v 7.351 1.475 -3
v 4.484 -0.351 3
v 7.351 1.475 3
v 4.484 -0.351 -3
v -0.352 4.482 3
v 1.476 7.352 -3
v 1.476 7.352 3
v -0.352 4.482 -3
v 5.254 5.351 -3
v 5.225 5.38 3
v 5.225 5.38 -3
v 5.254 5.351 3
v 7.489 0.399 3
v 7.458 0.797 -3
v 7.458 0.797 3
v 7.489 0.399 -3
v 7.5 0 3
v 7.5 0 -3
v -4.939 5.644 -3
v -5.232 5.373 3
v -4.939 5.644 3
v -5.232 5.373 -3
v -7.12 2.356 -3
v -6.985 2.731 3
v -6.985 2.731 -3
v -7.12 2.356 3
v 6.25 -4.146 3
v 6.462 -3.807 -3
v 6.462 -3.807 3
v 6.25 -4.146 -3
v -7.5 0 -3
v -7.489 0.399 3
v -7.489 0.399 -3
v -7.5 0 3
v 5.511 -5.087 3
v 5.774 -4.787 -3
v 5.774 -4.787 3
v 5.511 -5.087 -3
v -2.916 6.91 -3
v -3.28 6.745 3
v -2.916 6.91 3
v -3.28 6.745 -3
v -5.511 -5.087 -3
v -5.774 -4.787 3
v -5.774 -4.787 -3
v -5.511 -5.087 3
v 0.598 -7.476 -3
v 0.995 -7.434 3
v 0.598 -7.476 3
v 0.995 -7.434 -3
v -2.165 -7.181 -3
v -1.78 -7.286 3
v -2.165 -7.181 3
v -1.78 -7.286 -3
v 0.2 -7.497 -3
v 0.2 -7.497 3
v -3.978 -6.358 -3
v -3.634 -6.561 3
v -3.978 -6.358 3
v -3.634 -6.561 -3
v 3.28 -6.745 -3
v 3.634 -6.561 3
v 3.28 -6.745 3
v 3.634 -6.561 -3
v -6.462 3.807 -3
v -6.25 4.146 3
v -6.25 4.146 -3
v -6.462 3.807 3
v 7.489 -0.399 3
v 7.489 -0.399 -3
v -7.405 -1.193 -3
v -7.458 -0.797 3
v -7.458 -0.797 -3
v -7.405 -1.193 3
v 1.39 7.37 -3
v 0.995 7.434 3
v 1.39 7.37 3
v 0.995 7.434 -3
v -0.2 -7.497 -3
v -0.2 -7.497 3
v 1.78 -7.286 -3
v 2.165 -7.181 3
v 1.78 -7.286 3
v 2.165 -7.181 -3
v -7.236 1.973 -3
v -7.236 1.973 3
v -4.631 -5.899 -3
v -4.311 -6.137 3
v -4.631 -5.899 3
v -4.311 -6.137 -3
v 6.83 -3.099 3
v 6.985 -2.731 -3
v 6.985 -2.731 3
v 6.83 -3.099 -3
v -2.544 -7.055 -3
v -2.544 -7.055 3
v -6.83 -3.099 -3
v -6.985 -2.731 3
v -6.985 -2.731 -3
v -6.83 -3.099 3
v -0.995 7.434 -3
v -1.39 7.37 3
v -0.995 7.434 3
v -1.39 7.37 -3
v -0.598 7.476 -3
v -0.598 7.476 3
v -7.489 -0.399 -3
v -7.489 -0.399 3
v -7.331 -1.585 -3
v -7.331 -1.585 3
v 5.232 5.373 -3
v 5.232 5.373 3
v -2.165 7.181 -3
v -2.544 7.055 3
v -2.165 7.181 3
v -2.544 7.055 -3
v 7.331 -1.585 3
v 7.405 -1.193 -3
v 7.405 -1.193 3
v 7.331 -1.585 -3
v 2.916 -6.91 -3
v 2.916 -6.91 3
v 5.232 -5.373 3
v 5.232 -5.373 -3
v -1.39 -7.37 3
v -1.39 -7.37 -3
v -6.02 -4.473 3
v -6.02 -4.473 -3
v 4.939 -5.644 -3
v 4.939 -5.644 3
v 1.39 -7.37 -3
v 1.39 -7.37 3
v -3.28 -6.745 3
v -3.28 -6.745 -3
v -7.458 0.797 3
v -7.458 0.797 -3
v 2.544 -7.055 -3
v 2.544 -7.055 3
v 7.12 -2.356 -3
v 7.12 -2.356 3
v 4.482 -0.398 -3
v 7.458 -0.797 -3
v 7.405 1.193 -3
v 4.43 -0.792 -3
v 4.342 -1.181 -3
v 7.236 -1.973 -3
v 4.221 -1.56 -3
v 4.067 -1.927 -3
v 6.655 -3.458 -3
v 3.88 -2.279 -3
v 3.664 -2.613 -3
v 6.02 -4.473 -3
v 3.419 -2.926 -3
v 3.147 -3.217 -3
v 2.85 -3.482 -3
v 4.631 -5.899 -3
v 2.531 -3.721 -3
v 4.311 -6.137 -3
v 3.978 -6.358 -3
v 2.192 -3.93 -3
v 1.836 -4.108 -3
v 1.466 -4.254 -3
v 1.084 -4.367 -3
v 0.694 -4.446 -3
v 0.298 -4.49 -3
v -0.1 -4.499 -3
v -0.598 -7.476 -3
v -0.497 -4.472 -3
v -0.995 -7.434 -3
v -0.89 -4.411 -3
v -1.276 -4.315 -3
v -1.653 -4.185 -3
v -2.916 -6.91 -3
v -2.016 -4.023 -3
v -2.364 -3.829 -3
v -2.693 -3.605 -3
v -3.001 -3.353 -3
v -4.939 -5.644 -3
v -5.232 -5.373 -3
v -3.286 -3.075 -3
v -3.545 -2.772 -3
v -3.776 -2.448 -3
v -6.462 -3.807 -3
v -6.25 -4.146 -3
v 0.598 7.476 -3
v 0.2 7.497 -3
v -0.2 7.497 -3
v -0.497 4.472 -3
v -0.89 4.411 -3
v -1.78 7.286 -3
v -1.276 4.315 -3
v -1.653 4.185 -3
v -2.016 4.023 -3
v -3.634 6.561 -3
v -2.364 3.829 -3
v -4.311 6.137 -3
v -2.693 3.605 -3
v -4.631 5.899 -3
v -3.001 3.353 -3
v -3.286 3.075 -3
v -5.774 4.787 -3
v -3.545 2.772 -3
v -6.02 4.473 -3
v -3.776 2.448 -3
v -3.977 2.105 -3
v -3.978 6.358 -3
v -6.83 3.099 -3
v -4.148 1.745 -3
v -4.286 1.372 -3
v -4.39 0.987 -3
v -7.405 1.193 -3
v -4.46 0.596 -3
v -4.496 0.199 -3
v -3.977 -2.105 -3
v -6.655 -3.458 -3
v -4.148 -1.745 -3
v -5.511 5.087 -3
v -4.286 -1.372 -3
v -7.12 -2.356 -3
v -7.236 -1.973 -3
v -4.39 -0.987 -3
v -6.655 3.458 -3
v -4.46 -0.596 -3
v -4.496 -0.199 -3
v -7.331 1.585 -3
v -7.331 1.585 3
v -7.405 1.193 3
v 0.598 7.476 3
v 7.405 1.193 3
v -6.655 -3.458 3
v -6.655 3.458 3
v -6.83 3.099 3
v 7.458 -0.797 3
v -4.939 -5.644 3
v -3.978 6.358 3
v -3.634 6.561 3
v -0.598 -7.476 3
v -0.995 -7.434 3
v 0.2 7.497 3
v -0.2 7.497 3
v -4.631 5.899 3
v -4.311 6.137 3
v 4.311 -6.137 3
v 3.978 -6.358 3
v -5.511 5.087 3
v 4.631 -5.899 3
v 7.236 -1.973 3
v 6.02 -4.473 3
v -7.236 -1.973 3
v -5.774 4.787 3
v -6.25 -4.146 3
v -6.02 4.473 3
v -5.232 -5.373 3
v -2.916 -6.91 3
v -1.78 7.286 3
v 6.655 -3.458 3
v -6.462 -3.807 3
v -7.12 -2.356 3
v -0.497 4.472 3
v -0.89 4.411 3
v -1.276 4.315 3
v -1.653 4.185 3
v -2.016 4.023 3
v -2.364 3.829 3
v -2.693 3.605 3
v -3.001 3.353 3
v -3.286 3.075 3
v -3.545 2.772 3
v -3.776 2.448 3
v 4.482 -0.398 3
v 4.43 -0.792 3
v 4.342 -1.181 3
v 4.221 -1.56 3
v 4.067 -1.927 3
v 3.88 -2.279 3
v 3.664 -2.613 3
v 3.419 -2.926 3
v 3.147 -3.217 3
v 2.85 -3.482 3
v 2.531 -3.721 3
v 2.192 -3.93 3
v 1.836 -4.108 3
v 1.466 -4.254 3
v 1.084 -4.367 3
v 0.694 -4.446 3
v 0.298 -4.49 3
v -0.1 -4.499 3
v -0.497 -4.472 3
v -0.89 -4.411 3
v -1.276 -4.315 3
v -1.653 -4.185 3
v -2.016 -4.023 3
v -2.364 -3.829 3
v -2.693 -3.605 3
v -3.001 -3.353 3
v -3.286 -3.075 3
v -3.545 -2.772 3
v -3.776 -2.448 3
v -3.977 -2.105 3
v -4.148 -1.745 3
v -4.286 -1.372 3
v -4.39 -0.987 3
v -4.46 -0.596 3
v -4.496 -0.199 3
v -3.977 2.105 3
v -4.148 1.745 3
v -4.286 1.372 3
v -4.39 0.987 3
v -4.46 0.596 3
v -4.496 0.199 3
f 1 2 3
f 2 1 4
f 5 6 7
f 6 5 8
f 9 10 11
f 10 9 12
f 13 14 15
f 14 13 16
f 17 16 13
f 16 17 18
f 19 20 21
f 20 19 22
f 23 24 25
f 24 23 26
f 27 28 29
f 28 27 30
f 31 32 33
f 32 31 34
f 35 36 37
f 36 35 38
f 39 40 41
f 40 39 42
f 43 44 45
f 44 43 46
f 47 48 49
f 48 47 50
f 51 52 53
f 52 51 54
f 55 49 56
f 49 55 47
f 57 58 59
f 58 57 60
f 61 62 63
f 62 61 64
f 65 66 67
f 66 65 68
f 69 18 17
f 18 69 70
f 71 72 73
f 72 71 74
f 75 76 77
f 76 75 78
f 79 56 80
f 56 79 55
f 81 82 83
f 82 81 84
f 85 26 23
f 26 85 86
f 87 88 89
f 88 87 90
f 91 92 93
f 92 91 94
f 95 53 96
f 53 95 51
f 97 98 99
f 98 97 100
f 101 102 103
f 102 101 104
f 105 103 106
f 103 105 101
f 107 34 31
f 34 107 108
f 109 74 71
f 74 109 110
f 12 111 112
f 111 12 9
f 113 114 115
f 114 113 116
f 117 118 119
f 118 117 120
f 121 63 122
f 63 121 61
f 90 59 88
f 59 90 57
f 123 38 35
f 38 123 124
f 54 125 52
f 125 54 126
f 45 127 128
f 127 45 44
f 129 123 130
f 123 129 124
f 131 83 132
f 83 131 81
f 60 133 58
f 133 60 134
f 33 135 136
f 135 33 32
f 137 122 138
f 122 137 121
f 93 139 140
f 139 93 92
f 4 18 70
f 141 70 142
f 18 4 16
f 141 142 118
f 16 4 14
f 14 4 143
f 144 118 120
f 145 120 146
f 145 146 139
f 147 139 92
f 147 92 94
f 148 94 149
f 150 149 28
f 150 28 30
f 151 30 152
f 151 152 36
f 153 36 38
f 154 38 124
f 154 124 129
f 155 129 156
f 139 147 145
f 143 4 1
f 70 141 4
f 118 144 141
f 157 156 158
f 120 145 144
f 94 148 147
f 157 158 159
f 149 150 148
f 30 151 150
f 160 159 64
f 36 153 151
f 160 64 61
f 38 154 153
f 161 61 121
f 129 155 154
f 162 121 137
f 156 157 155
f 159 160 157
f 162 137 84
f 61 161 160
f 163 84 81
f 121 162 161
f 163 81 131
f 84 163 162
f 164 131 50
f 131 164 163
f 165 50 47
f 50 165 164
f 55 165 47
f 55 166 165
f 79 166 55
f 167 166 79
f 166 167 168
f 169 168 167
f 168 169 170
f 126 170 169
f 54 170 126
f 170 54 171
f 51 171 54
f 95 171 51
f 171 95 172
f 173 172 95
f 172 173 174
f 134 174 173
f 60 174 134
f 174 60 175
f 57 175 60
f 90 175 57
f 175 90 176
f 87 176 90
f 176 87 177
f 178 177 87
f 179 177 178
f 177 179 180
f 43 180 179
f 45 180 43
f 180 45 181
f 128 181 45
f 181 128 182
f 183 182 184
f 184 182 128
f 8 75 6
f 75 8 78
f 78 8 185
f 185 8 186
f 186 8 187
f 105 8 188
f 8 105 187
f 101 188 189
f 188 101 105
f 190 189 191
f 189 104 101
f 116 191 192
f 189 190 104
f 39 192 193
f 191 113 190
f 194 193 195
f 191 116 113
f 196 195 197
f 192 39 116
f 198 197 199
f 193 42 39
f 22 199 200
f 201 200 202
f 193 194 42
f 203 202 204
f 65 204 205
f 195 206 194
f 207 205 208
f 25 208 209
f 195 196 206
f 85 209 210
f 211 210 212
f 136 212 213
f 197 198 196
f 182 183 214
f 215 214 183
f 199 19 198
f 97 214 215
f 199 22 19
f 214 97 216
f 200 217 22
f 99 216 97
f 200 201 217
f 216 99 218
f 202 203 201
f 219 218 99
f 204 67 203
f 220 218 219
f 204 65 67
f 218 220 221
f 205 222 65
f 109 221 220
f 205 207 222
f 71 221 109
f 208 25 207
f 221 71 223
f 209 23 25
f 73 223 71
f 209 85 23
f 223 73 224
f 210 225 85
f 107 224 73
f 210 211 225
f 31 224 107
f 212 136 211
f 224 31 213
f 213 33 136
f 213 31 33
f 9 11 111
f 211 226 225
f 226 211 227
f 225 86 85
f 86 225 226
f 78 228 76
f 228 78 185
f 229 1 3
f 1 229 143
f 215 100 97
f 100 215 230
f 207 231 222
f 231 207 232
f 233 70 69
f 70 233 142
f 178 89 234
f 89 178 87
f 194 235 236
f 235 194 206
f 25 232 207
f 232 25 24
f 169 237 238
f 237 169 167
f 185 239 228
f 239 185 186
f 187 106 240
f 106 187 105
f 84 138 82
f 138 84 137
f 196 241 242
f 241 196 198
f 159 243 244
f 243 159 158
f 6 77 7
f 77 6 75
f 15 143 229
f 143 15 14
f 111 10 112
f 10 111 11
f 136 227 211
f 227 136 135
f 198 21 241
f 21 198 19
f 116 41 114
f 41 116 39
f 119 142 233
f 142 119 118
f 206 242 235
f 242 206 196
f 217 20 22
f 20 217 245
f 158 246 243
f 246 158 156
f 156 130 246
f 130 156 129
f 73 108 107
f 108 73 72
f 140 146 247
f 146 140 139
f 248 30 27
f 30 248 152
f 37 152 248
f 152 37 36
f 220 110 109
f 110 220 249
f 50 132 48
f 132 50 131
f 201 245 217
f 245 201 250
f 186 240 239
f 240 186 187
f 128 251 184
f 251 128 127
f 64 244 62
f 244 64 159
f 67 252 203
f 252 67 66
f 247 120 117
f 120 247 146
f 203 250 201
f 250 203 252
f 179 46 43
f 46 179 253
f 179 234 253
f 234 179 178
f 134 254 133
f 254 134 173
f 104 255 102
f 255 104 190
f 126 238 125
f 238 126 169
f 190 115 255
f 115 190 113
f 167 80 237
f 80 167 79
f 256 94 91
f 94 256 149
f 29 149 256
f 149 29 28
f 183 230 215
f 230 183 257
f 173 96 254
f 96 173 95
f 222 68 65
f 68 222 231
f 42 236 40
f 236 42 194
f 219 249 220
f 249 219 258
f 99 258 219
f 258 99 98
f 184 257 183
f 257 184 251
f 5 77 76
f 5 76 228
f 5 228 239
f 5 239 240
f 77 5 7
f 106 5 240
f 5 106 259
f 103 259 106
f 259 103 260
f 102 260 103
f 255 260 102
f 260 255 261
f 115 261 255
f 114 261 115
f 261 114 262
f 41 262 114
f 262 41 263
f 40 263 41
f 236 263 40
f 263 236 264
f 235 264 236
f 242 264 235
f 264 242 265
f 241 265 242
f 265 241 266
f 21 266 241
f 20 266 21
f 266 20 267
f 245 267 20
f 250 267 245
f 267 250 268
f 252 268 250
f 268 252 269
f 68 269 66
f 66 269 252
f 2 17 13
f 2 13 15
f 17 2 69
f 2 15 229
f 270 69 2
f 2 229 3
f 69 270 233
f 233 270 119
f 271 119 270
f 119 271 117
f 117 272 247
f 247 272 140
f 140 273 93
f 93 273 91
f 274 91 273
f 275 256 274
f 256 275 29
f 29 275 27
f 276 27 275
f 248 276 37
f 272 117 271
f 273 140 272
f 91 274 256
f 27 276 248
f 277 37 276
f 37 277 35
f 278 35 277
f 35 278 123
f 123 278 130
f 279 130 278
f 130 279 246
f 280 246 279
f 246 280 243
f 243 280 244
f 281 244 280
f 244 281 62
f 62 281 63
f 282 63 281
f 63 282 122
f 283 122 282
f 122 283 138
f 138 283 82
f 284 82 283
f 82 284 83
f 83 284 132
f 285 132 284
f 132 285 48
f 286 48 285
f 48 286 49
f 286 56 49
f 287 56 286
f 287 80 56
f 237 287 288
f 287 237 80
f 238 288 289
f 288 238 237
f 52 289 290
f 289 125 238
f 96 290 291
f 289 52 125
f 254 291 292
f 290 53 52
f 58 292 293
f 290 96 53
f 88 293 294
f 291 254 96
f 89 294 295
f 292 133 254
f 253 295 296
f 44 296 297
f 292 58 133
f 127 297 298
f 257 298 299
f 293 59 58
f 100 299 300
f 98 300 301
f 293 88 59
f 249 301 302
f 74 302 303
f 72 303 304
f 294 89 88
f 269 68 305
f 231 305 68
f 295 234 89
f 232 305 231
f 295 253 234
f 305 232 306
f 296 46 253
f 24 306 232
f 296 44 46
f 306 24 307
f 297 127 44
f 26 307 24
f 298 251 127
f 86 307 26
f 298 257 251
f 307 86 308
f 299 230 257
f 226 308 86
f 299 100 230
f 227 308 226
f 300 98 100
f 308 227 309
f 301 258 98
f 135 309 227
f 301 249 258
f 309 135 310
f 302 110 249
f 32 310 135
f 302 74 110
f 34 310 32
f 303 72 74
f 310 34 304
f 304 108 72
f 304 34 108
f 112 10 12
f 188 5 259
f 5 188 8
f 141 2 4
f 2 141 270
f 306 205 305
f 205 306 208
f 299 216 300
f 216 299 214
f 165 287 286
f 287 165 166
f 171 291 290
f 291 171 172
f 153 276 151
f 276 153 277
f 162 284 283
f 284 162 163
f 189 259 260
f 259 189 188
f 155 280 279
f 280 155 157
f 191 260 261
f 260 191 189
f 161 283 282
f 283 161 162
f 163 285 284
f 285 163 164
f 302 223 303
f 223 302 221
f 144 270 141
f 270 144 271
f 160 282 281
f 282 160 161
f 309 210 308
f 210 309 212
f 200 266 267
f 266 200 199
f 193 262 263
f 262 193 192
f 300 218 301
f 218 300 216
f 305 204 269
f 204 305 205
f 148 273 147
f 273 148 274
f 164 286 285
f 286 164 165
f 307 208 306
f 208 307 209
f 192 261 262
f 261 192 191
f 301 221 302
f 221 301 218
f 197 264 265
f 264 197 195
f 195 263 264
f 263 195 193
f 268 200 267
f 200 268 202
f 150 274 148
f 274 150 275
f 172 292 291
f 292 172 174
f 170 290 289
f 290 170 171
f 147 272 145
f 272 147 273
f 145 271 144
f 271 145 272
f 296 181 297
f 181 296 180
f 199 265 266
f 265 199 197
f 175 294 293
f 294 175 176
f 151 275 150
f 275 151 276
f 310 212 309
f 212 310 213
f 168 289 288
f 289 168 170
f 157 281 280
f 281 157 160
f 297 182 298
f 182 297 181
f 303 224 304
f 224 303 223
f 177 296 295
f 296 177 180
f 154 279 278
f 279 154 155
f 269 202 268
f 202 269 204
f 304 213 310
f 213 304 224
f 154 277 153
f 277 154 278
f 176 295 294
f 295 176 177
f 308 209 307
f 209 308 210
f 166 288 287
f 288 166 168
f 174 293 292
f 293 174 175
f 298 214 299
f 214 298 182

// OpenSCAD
// rendering resolution
$fa = 1;
$fs = 0.4;

// always cut a little more than you need to
$tolerance = 0.1;

// clip parameters
$height = 6;
$diameter = 15;
$innerDiameter = 9;

module pieSlice(a, r, h){
  // a:angle, r:radius, h:height
  rotate_extrude(angle=a)
    square([r,h]);
}

difference()
{
    $radius = $diameter/2;

    // create outer circle
    cylinder(r=$radius, h=$height, center=true);

    // delete inner circle
    cylinder(r=$innerDiameter/2, h=$height+$tolerance, center=true);

    // cut out a slice
    difference()
    {
        $shift = (20 - $diameter/2) / sqrt(2);
        // the slice
        translate([-$shift, -$shift, -($height/2 + $tolerance/2)])
        rotate(45-12.5)
            pieSlice(25, 20, $height+$tolerance);

        // don't cut out stuff in Q3
        translate([-50, -50, -25])
          cube([50, 50, 50]);
    }
}
